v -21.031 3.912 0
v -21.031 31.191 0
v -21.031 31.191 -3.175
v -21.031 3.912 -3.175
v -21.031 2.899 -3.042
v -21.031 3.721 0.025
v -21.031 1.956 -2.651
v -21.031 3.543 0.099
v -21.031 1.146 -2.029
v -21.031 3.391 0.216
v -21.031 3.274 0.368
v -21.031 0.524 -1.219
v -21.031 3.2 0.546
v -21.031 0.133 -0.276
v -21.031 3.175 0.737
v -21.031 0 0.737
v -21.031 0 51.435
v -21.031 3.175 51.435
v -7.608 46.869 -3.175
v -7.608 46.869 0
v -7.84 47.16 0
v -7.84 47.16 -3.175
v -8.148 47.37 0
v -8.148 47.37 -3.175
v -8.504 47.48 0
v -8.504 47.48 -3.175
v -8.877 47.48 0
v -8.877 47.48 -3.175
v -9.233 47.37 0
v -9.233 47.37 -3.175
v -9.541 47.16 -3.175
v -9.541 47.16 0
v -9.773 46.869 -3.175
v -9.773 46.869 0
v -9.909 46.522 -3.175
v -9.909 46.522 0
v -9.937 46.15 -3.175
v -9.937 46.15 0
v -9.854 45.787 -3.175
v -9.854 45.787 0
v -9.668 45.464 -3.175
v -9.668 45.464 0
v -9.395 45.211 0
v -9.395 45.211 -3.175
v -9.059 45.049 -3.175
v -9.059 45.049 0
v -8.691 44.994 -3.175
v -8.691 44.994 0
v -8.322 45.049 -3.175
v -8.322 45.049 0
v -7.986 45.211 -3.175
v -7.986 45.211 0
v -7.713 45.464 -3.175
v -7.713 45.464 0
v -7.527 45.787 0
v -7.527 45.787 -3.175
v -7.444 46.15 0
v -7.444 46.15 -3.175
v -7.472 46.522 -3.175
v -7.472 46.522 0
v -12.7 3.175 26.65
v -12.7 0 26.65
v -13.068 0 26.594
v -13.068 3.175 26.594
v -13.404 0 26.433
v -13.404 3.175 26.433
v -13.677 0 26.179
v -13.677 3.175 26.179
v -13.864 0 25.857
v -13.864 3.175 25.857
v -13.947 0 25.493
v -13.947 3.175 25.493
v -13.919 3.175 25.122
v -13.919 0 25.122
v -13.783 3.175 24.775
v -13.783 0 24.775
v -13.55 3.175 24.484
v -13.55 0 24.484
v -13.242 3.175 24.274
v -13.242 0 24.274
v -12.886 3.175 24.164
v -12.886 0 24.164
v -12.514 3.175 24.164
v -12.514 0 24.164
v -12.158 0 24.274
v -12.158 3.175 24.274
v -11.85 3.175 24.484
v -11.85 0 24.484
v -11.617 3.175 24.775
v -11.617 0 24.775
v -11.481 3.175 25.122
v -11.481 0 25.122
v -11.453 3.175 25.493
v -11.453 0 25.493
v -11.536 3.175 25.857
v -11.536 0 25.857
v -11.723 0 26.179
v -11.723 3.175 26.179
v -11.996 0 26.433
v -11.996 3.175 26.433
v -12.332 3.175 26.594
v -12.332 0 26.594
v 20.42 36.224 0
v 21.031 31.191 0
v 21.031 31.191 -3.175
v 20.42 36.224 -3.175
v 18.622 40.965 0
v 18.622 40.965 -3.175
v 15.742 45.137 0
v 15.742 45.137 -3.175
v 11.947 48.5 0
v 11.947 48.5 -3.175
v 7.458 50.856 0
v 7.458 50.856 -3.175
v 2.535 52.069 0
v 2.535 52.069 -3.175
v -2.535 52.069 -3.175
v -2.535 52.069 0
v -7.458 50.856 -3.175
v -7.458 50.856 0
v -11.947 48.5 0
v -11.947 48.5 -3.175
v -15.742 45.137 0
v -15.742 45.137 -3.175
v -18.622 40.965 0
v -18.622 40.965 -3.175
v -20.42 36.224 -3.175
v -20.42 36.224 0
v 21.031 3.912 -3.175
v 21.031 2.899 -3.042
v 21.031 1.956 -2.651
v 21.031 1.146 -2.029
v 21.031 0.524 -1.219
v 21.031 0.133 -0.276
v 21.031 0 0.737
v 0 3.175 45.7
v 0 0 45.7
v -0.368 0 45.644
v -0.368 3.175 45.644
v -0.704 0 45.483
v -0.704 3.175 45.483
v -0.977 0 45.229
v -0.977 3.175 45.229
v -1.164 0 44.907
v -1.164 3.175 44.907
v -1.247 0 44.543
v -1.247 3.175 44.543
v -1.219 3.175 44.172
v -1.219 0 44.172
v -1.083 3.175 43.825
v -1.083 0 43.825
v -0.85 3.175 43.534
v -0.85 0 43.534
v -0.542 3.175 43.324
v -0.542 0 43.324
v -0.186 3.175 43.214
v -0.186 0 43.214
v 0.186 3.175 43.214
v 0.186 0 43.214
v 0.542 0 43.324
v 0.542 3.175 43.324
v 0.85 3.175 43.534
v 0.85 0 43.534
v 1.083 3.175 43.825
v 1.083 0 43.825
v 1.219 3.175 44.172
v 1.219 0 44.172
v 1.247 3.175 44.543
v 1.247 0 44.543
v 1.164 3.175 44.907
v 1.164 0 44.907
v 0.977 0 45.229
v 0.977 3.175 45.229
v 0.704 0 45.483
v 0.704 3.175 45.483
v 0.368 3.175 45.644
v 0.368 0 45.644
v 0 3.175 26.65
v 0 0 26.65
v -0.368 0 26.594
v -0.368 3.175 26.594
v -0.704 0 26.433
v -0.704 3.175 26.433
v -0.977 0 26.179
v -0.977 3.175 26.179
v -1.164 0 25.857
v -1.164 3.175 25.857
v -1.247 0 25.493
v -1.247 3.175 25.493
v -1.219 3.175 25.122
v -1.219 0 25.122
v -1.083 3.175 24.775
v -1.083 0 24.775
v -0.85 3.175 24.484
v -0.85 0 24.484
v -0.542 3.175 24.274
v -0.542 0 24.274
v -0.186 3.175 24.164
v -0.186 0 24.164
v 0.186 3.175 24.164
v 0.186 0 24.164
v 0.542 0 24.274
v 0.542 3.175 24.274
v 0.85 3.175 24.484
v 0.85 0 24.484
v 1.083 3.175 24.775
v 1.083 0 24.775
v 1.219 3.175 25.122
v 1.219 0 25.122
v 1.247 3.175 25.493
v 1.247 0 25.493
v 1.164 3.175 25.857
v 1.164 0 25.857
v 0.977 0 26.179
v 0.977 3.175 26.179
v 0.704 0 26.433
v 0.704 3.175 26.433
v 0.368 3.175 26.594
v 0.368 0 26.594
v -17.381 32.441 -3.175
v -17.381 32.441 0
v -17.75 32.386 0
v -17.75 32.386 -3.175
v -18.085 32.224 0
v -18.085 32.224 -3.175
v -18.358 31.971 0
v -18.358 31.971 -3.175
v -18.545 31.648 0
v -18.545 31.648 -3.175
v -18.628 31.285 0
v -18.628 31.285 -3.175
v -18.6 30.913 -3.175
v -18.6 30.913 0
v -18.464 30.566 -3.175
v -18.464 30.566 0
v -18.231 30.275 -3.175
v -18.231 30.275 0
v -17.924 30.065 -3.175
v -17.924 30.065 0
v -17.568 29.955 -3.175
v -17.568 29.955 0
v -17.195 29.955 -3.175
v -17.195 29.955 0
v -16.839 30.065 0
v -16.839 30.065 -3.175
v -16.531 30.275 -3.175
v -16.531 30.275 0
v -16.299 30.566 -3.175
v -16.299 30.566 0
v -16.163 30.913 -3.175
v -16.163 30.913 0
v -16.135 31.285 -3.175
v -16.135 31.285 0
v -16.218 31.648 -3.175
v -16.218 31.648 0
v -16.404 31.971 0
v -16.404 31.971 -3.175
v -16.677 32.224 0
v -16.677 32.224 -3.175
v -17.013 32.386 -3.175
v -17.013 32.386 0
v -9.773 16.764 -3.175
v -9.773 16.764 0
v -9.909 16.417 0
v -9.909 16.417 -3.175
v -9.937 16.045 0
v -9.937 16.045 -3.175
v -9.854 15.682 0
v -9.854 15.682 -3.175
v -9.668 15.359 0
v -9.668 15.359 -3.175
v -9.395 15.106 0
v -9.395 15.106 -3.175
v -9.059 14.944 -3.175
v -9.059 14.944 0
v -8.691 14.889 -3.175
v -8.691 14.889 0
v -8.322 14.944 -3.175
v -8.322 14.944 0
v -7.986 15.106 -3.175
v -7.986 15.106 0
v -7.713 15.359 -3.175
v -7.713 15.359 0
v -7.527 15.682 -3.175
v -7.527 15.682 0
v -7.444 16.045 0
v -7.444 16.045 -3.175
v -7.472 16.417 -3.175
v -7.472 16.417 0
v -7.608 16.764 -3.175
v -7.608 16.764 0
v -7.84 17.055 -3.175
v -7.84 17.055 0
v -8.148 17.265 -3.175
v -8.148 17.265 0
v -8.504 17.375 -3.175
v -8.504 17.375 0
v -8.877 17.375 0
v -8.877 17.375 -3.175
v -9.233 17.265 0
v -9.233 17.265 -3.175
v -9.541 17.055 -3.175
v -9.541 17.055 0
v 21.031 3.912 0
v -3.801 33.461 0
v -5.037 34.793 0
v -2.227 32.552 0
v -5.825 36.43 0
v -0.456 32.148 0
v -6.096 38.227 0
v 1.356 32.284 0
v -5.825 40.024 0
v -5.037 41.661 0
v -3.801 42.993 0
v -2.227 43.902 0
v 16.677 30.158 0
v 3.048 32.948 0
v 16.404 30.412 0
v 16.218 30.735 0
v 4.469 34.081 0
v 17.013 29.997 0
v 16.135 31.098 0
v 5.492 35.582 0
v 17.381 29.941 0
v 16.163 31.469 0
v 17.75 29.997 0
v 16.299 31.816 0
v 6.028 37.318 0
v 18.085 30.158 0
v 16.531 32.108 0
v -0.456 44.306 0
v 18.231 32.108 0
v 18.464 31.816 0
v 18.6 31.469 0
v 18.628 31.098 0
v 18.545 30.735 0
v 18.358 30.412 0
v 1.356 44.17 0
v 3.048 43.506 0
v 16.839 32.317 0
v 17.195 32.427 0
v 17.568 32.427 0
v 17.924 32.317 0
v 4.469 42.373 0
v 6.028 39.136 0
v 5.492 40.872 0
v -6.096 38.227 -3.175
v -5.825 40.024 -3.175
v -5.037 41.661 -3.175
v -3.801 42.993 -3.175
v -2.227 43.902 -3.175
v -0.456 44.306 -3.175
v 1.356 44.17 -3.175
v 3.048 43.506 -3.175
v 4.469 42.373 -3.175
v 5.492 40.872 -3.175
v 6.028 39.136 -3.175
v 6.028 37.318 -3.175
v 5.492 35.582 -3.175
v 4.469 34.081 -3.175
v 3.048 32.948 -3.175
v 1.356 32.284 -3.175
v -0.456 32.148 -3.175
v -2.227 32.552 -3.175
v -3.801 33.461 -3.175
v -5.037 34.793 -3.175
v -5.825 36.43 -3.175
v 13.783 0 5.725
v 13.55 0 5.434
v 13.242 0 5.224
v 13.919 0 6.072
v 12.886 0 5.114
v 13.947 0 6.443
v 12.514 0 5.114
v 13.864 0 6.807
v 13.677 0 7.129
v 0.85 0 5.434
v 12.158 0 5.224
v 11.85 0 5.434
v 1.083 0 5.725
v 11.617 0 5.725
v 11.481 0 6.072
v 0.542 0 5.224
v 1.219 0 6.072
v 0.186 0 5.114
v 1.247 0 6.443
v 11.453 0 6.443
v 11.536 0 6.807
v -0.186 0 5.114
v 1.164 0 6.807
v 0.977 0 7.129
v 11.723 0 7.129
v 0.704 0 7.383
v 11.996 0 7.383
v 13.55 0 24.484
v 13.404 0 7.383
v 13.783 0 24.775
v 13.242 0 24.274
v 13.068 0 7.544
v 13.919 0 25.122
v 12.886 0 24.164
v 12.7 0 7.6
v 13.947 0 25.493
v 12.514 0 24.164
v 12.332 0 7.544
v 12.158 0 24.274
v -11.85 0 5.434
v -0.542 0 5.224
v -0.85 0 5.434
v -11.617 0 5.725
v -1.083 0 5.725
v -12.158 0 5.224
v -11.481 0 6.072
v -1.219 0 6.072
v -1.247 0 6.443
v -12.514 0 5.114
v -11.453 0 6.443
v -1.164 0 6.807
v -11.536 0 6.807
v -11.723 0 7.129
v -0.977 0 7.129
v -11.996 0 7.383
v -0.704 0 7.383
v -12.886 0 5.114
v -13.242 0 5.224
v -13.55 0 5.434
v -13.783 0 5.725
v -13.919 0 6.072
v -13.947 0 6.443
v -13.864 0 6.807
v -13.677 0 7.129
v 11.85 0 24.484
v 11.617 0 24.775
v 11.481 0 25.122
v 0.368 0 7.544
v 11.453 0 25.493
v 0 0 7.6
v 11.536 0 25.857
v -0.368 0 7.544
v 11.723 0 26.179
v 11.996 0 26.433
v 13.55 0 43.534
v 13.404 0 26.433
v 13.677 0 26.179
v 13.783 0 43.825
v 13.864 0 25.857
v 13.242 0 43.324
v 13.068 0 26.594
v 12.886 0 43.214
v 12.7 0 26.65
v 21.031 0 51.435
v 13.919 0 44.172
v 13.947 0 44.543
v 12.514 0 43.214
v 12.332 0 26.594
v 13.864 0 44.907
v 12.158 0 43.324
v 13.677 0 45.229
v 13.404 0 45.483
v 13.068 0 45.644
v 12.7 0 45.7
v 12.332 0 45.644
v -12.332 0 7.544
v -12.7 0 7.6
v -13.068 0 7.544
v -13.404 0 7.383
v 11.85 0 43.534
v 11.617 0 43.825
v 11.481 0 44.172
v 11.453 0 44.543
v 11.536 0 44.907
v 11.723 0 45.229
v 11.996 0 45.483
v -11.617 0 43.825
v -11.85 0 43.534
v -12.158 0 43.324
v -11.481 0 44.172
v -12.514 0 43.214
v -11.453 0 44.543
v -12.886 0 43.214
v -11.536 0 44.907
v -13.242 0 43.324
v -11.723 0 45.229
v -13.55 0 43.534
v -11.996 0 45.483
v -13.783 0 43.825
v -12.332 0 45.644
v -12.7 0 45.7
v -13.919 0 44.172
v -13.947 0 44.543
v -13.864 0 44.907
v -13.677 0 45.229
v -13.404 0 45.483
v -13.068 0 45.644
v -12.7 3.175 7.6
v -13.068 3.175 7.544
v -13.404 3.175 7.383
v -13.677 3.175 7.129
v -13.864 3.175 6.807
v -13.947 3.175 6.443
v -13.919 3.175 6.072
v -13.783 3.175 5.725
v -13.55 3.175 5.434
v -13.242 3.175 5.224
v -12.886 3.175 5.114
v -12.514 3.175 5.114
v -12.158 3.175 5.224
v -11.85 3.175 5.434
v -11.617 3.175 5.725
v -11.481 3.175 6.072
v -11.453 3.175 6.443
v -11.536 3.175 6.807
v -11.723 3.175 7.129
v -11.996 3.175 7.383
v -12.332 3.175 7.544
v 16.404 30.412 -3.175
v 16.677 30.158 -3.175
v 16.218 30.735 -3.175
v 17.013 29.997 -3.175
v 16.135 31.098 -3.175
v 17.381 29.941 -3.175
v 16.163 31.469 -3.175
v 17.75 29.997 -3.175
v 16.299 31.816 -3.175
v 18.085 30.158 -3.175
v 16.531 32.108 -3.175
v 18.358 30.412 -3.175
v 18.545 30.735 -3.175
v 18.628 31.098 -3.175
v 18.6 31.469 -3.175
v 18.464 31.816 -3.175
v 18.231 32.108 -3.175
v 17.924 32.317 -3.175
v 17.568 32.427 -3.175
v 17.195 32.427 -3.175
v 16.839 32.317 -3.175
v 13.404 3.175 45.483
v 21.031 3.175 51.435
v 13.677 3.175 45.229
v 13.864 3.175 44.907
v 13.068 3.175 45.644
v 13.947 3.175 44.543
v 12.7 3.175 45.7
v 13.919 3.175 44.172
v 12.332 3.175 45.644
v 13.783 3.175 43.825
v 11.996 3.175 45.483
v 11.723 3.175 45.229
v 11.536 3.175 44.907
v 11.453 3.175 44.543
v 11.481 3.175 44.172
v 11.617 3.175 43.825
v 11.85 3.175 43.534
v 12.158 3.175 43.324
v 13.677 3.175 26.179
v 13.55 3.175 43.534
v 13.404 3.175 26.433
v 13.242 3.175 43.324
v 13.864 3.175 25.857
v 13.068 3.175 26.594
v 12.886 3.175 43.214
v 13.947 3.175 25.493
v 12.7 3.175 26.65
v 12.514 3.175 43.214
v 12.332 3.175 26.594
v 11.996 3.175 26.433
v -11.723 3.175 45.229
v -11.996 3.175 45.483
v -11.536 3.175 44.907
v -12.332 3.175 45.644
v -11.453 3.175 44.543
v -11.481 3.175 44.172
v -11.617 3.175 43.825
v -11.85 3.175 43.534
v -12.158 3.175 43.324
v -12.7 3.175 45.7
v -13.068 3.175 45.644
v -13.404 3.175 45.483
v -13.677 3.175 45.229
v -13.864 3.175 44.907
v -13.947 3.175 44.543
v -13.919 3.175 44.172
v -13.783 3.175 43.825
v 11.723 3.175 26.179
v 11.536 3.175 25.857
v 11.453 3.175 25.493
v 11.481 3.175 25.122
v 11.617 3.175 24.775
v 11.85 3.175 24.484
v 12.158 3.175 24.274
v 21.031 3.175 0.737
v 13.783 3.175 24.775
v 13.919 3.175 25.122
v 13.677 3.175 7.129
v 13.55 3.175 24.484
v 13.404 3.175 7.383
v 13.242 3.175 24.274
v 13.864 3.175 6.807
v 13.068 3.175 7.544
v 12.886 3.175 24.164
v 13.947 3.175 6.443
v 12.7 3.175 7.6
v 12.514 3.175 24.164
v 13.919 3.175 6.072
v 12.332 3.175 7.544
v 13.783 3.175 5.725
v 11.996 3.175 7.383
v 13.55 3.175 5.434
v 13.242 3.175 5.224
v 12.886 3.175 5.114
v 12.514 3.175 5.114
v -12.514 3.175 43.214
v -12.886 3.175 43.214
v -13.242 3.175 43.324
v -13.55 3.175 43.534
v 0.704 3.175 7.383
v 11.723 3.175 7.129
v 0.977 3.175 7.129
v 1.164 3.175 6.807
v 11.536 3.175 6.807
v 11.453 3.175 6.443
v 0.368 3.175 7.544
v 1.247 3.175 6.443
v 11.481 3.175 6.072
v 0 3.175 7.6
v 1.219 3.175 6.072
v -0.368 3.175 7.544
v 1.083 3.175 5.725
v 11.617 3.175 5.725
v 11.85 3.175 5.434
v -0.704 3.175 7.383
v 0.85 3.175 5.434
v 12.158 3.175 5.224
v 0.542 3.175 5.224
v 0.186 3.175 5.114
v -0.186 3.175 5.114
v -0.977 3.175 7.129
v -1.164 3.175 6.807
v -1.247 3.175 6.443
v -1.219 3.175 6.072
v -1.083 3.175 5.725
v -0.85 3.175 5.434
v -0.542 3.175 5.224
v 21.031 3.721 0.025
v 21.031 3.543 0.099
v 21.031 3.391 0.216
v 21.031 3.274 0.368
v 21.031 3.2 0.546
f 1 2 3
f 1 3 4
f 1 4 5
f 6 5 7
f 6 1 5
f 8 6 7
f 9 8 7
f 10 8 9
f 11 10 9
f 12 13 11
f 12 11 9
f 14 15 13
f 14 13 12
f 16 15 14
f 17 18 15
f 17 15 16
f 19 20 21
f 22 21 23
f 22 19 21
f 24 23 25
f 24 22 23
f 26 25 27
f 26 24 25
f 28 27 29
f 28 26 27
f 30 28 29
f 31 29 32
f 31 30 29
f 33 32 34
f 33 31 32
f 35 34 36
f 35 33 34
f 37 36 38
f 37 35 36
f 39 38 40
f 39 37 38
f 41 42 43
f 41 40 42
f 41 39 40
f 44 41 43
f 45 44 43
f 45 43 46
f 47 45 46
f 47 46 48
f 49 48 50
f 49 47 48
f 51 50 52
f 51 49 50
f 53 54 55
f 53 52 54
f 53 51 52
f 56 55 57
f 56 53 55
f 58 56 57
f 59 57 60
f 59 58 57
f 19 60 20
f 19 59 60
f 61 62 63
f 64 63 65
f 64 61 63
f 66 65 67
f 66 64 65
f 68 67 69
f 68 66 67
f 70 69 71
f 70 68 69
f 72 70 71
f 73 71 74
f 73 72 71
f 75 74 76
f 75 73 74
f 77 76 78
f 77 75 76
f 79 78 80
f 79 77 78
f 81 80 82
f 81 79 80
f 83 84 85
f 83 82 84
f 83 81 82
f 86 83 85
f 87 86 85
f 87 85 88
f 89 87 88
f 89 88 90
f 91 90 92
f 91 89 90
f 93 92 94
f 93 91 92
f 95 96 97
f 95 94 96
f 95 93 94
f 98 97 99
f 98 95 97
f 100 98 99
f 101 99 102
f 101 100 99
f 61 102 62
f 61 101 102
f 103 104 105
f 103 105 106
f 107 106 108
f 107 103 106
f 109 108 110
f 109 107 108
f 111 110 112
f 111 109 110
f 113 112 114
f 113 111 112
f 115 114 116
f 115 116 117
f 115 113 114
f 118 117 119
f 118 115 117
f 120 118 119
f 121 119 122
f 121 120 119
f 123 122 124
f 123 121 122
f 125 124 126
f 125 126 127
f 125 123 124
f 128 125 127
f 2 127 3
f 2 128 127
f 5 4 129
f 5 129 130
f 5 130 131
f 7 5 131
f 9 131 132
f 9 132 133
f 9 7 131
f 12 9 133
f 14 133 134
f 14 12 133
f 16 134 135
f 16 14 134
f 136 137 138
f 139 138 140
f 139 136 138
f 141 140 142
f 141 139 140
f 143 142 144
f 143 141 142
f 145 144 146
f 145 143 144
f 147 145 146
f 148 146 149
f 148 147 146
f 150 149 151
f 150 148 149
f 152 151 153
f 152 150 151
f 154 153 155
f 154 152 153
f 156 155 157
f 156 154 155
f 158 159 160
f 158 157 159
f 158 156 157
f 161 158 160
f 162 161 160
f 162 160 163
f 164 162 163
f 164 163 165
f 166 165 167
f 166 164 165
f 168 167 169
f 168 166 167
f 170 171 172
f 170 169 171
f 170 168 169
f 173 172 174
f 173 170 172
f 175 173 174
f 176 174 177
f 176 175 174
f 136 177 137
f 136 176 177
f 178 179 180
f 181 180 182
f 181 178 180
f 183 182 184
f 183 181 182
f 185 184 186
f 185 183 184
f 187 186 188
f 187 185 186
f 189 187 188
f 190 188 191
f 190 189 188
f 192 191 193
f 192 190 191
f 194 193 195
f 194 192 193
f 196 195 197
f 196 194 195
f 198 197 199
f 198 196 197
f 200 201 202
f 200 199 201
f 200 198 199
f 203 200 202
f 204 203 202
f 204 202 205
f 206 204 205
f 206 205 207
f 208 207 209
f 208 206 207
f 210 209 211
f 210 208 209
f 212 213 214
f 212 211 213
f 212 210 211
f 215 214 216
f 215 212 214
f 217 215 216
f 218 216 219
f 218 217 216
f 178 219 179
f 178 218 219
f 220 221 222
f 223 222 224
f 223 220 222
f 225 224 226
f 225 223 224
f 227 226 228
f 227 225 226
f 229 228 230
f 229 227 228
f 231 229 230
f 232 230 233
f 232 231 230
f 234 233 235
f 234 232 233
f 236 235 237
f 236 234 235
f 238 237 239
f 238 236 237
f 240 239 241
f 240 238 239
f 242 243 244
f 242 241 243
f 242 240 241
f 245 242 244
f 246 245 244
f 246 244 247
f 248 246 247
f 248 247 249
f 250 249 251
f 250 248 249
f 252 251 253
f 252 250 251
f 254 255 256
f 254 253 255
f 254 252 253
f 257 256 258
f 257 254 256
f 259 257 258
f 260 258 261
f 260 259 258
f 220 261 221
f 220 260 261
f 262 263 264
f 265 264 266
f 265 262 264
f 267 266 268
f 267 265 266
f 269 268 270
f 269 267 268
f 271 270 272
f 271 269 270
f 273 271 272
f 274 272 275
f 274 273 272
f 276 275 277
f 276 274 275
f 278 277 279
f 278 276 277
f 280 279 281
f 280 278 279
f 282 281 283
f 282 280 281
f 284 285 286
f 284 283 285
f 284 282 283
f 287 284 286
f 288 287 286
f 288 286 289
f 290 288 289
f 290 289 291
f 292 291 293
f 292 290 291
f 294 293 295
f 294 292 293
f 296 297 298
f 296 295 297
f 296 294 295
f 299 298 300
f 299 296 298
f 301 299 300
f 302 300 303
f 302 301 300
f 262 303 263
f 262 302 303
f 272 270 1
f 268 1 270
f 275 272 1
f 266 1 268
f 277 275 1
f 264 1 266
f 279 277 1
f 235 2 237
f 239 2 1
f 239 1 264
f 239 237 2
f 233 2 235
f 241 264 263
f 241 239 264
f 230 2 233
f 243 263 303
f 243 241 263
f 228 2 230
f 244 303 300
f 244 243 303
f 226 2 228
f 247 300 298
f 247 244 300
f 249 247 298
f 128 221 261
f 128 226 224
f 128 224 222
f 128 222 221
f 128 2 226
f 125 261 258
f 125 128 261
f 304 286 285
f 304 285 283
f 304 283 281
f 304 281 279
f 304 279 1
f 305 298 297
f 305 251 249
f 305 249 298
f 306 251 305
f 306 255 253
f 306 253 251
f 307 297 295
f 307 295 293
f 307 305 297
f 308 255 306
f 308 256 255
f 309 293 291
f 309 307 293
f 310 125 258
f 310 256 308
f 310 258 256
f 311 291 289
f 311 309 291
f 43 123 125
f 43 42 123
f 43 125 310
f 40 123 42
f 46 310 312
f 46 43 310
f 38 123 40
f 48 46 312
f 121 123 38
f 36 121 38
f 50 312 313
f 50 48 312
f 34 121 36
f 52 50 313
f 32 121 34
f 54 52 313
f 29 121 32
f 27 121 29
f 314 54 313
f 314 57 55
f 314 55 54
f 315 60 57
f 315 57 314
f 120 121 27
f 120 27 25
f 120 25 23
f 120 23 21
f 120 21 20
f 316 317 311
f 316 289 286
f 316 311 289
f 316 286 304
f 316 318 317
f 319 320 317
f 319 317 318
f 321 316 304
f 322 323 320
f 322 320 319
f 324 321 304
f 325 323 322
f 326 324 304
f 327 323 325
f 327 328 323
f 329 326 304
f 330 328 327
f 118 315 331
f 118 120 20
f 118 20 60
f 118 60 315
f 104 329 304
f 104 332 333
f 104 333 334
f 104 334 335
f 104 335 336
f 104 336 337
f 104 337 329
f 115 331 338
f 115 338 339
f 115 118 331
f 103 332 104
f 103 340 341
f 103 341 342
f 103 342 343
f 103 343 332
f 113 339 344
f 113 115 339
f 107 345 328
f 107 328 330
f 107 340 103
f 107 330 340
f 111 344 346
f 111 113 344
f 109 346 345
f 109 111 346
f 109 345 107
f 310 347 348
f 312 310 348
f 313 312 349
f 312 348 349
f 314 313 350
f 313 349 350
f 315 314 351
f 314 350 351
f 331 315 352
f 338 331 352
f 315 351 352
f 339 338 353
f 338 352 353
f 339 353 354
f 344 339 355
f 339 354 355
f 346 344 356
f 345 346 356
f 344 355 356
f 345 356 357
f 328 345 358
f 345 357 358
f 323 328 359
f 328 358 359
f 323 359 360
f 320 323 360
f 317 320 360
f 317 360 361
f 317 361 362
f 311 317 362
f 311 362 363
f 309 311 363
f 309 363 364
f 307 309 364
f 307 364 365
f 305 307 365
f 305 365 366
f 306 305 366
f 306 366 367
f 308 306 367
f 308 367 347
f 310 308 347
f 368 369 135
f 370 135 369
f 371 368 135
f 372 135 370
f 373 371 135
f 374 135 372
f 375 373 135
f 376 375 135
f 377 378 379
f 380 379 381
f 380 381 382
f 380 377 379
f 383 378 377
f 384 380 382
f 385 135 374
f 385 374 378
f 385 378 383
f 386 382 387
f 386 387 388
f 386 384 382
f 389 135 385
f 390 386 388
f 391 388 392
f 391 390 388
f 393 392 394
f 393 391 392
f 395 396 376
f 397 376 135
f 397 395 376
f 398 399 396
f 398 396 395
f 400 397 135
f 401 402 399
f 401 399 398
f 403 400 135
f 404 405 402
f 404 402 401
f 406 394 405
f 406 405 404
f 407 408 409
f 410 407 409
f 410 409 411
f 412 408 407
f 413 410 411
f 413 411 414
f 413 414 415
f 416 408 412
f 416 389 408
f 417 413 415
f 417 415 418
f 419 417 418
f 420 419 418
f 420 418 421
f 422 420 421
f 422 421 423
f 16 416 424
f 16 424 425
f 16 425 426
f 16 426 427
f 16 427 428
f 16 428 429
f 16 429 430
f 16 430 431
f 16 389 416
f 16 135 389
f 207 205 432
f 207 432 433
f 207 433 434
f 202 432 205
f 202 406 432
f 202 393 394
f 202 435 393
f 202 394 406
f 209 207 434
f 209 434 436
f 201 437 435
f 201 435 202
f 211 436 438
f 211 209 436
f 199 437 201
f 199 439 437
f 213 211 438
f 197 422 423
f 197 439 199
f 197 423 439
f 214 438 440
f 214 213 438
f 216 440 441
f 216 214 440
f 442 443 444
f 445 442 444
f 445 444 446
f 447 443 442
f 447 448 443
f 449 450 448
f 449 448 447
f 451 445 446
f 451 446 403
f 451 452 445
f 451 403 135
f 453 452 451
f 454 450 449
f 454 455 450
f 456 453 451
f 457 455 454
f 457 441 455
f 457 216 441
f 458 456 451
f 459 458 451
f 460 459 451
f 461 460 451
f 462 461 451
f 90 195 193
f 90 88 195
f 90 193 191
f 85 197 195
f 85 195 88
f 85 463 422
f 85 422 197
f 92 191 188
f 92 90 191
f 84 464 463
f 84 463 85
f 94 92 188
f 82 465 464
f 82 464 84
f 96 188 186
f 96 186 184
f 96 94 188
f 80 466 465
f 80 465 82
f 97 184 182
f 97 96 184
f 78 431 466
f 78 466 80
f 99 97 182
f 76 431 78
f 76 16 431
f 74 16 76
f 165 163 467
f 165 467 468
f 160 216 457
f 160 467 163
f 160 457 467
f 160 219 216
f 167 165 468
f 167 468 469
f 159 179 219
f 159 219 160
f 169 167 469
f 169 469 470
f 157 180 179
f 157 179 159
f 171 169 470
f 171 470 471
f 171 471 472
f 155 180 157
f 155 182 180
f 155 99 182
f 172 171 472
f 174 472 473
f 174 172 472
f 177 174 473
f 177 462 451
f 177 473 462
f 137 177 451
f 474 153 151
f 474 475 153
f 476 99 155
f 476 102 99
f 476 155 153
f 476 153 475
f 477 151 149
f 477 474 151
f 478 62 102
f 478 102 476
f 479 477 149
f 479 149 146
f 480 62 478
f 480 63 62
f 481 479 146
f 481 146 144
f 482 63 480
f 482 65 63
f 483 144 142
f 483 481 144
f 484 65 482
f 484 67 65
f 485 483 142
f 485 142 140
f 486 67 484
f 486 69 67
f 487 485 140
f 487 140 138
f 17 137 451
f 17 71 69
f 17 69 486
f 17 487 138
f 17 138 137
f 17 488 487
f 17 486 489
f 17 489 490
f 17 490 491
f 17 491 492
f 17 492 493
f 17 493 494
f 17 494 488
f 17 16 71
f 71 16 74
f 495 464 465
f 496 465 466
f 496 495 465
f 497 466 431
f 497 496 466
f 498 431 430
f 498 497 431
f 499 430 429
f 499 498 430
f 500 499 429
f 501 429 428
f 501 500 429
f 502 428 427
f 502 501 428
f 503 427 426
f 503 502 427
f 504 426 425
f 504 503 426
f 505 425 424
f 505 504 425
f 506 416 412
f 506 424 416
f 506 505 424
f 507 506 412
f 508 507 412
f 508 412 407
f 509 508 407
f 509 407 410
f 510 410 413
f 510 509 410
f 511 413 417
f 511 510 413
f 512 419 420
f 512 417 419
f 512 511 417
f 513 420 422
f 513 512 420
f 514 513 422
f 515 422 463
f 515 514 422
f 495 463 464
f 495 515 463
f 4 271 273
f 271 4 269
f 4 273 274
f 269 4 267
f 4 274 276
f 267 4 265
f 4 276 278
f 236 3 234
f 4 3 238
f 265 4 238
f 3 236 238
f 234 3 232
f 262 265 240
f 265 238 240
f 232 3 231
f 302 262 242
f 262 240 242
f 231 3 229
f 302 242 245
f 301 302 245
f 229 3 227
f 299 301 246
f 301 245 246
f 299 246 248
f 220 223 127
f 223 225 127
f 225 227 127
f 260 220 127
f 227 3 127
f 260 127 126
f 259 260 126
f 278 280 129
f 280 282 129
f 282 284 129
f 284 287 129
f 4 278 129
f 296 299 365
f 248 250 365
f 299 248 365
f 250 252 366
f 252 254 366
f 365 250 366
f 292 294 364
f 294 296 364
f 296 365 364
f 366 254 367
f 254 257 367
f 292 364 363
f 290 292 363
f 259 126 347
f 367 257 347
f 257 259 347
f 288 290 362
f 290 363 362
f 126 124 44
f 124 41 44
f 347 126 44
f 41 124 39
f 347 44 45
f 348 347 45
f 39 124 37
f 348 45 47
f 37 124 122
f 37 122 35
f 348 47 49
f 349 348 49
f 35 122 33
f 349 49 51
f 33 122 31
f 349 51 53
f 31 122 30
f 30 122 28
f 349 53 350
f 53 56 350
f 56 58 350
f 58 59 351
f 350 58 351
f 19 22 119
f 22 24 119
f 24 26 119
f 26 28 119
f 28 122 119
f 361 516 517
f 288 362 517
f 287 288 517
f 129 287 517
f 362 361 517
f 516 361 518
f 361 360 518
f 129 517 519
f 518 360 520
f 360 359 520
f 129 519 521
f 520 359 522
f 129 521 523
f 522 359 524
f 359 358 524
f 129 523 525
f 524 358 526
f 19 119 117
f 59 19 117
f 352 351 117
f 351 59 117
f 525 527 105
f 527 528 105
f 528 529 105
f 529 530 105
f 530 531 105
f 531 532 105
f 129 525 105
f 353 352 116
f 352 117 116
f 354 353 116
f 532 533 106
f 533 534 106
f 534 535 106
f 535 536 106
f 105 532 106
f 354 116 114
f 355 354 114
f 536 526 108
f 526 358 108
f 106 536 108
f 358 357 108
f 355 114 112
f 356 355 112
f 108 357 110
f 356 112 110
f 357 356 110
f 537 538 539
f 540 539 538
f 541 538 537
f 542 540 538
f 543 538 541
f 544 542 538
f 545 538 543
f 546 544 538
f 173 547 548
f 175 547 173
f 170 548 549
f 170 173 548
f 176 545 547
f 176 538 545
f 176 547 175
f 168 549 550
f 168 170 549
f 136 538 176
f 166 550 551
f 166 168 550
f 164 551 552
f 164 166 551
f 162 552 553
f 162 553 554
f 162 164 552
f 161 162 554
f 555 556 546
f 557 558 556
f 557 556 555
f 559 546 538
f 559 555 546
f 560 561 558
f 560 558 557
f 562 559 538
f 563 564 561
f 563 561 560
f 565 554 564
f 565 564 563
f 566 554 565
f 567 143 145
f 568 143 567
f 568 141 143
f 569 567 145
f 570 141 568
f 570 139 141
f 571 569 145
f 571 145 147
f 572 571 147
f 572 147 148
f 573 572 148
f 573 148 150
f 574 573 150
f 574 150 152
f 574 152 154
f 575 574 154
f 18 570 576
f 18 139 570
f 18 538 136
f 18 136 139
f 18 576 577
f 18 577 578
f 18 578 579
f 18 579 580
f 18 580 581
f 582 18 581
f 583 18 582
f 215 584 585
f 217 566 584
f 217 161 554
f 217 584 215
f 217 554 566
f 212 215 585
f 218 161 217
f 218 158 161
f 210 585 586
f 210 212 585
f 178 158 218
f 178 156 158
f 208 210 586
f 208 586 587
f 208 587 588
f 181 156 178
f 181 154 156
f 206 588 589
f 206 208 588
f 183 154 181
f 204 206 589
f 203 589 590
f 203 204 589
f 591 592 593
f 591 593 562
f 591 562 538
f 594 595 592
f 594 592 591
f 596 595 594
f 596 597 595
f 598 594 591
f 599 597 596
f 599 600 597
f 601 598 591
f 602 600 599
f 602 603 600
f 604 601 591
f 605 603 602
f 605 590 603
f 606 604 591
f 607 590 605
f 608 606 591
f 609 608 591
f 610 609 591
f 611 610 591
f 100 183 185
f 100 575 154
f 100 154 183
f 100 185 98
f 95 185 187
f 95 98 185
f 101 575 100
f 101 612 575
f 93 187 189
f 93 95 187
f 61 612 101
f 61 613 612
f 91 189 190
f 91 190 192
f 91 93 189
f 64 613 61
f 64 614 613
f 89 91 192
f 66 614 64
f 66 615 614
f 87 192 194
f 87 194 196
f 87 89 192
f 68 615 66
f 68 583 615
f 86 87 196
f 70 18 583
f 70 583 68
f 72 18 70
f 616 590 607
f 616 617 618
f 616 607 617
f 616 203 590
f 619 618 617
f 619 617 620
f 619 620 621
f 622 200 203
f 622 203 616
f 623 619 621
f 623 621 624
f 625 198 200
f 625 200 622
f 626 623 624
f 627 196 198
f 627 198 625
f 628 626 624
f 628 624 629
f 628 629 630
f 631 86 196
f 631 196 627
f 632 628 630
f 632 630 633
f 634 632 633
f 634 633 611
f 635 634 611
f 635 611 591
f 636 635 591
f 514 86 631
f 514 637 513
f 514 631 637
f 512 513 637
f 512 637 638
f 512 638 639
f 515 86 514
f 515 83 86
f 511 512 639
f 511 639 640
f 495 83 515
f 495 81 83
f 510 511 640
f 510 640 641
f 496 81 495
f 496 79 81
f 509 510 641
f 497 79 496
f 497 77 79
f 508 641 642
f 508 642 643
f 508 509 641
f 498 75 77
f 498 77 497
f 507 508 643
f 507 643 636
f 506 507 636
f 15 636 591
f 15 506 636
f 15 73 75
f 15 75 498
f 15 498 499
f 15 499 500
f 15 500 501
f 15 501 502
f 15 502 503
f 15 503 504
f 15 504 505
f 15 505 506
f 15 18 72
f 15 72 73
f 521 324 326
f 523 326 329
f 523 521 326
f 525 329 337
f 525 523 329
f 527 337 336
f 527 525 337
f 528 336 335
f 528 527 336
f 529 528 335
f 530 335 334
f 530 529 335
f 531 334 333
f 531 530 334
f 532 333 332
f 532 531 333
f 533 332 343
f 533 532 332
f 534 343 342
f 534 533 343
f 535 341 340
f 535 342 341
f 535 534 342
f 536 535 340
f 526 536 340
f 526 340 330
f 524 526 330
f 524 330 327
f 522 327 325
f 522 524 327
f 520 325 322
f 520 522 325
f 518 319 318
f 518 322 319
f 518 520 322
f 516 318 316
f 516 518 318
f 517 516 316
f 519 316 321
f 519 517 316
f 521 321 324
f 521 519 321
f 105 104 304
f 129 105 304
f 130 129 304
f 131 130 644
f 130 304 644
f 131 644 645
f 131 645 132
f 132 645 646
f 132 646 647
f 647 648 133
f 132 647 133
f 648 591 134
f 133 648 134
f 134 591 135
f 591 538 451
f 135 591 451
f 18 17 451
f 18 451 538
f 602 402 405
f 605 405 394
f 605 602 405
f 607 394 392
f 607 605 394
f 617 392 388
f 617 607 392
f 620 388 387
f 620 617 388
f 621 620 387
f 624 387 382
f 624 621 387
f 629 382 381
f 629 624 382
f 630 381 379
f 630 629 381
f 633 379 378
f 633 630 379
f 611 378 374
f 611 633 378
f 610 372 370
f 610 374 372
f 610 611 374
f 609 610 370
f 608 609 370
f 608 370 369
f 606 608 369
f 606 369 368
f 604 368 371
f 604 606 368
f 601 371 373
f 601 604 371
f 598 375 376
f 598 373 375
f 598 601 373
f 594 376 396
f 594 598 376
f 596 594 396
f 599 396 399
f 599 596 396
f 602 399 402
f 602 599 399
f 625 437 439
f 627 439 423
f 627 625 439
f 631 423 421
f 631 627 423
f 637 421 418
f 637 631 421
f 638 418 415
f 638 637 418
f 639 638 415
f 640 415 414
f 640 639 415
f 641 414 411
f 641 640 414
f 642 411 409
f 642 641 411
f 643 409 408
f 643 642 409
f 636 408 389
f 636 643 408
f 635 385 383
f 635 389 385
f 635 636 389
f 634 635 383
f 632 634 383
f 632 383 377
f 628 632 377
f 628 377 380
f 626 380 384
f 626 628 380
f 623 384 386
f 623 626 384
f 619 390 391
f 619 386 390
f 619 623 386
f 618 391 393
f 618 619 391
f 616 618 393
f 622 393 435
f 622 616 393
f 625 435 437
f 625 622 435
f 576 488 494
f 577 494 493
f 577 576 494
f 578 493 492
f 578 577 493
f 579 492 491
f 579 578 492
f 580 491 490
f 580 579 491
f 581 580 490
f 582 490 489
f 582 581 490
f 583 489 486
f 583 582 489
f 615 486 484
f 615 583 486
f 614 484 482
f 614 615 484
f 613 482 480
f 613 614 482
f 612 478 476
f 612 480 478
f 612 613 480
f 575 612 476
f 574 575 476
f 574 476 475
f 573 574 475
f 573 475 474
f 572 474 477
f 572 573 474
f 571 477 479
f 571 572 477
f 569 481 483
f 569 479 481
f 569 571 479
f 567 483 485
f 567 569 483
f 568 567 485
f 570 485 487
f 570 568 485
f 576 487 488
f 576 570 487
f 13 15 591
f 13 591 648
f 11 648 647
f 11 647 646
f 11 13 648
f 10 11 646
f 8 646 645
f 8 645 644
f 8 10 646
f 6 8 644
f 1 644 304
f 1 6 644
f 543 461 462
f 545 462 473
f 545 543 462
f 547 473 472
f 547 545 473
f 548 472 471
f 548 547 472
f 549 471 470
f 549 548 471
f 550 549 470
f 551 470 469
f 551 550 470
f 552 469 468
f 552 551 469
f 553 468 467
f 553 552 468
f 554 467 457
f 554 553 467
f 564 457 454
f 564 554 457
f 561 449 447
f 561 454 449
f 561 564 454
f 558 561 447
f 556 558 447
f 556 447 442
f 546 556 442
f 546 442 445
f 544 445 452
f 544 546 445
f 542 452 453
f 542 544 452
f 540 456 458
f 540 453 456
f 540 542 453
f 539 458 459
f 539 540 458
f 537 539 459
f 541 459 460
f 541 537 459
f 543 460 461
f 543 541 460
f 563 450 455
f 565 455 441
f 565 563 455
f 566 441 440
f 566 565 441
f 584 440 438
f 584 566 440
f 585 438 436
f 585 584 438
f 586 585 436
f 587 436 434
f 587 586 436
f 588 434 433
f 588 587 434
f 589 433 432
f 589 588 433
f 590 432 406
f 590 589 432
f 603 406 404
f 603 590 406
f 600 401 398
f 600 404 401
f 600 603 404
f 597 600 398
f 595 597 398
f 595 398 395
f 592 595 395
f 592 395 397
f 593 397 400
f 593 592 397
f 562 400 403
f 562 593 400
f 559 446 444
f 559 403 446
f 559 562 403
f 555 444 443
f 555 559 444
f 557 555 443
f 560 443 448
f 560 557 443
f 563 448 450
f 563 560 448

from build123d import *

# Parameters (mm, degrees)
BASE_FLANGIA1_DEPTH            = 3.175
BORDO_FLANGIA1_STRIP_W         = 14.1732
BORDO_FLANGIA1_STRIP_H         = 3.175
BORDO_FLANGIA1_STRIP_CUT_DEPTH = 42.0624
BORDO_FLANGIA1_DEPTH           = 42.0624
RIPETIZIONE_A_L1_COUNT         = 3
RIPETIZIONE_A_L1_PITCH         = 19.05
RIPETIZIONE_A_L1_COUNT_DIR2    = 3
RIPETIZIONE_A_L1_PITCH_DIR2    = 12.7
RIPETIZIONECIRCOLARE1_COUNT    = 6
SCHIZZO13_R                    = 6.096
TAGLIO_ESTRUSIONE1_DEPTH       = 10


# Sheet-metal steps are written as plain solids
with BuildPart() as part:
    # Schizzo1 → Base-Flangia1 (new body)
    with BuildSketch(Plane.XY):
        with BuildLine():
            Line((-21.0312, 0), (21.0312, 0))
            Line((21.0312, 0), (21.0312, 31.1912))
            ThreePointArc((21.0312, 31.1912), (0, 52.2224), (-21.0312, 31.1912))
            Line((-21.0312, 31.1912), (-21.0312, 0))
        make_face()
    extrude(amount=-BASE_FLANGIA1_DEPTH)

    # Bordo-Flangia1 strip (across the edge) → Bordo-Flangia1 strip cut (cut)
    with BuildSketch(Plane.YZ.offset(-21.0312)):
        with Locations((-3.175, -1.5875)):
            Rectangle(BORDO_FLANGIA1_STRIP_W, BORDO_FLANGIA1_STRIP_H)
    extrude(amount=BORDO_FLANGIA1_STRIP_CUT_DEPTH, mode=Mode.SUBTRACT)

    # Bordo-Flangia1 section (across the edge) → Bordo-Flangia1 (add)
    with BuildSketch(Plane.YZ.offset(-21.0312)):
        with BuildLine():
            Line((0, 0.7366), (0, 51.435))
            Line((0, 51.435), (3.175, 51.435))
            Line((3.175, 51.435), (3.175, 0.7366))
            ThreePointArc((3.175, 0.7366), (3.390745145, 0.215745145), (3.9116, 0))
            Line((3.9116, 0), (3.9116, -3.175))
            ThreePointArc((3.9116, -3.175), (1.145681115, -2.029318885), (0, 0.7366))
        make_face()
    extrude(amount=BORDO_FLANGIA1_DEPTH)

    # Schizzo9 → Foro filettato M3x0.5-1 (revolve, cut)
    with BuildSketch(Plane(origin=(-12.7, 3.175, 6.35), x_dir=(0, 0, 1), z_dir=(1, 0, 0))):
        Polygon((0, 0), (0, 8.251075774), (1.25, 7.5), (1.25, 0), align=None)
    foro_filettato_m3x0_5_1 = revolve(axis=Axis((-12.7, 9.525, 6.35), (0, -1, 0)), mode=Mode.SUBTRACT)

    # Ripetizione a L1: Foro filettato M3x0.5-1 3 × 3
    with Locations(*[(j * RIPETIZIONE_A_L1_PITCH_DIR2, 0, i * RIPETIZIONE_A_L1_PITCH) for i in range(RIPETIZIONE_A_L1_COUNT) for j in range(RIPETIZIONE_A_L1_COUNT_DIR2) if (i, j) != (0, 0)]):
        add(foro_filettato_m3x0_5_1, mode=Mode.SUBTRACT)

    # Schizzo11 → Foro filettato M3x0.5-2 (revolve, cut)
    with BuildSketch(Plane(origin=(-17.3812, 31.1912, -3.175), x_dir=(0, 1, 0), z_dir=(1, 0, 0))):
        Polygon((0, 0), (0, 8.251075774), (1.25, 7.5), (1.25, 0), align=None)
    foro_filettato_m3x0_5_2 = revolve(axis=Axis((-17.3812, 31.1912, -9.525), (0, 0, 1)), mode=Mode.SUBTRACT)

    # RipetizioneCircolare1: Foro filettato M3x0.5-2 ×6 about axis, 2 skipped
    ripetizionecircolare1_axis = Axis((0, 31.1912, 0), (0, 0, 1))
    add([foro_filettato_m3x0_5_2.rotate(ripetizionecircolare1_axis, i * 360 / RIPETIZIONECIRCOLARE1_COUNT) for i in range(1, RIPETIZIONECIRCOLARE1_COUNT) if i not in (2, 4)], mode=Mode.SUBTRACT)

    # Schizzo13 → Taglio-Estrusione1 (cut)
    with BuildSketch(Plane(origin=(0, 0, -3.175), x_dir=(-1, 0, 0), z_dir=(0, 0, -1))):
        with Locations((0, 38.227)):
            Circle(SCHIZZO13_R)
    extrude(amount=-TAGLIO_ESTRUSIONE1_DEPTH, mode=Mode.SUBTRACT)


solid = part.part
